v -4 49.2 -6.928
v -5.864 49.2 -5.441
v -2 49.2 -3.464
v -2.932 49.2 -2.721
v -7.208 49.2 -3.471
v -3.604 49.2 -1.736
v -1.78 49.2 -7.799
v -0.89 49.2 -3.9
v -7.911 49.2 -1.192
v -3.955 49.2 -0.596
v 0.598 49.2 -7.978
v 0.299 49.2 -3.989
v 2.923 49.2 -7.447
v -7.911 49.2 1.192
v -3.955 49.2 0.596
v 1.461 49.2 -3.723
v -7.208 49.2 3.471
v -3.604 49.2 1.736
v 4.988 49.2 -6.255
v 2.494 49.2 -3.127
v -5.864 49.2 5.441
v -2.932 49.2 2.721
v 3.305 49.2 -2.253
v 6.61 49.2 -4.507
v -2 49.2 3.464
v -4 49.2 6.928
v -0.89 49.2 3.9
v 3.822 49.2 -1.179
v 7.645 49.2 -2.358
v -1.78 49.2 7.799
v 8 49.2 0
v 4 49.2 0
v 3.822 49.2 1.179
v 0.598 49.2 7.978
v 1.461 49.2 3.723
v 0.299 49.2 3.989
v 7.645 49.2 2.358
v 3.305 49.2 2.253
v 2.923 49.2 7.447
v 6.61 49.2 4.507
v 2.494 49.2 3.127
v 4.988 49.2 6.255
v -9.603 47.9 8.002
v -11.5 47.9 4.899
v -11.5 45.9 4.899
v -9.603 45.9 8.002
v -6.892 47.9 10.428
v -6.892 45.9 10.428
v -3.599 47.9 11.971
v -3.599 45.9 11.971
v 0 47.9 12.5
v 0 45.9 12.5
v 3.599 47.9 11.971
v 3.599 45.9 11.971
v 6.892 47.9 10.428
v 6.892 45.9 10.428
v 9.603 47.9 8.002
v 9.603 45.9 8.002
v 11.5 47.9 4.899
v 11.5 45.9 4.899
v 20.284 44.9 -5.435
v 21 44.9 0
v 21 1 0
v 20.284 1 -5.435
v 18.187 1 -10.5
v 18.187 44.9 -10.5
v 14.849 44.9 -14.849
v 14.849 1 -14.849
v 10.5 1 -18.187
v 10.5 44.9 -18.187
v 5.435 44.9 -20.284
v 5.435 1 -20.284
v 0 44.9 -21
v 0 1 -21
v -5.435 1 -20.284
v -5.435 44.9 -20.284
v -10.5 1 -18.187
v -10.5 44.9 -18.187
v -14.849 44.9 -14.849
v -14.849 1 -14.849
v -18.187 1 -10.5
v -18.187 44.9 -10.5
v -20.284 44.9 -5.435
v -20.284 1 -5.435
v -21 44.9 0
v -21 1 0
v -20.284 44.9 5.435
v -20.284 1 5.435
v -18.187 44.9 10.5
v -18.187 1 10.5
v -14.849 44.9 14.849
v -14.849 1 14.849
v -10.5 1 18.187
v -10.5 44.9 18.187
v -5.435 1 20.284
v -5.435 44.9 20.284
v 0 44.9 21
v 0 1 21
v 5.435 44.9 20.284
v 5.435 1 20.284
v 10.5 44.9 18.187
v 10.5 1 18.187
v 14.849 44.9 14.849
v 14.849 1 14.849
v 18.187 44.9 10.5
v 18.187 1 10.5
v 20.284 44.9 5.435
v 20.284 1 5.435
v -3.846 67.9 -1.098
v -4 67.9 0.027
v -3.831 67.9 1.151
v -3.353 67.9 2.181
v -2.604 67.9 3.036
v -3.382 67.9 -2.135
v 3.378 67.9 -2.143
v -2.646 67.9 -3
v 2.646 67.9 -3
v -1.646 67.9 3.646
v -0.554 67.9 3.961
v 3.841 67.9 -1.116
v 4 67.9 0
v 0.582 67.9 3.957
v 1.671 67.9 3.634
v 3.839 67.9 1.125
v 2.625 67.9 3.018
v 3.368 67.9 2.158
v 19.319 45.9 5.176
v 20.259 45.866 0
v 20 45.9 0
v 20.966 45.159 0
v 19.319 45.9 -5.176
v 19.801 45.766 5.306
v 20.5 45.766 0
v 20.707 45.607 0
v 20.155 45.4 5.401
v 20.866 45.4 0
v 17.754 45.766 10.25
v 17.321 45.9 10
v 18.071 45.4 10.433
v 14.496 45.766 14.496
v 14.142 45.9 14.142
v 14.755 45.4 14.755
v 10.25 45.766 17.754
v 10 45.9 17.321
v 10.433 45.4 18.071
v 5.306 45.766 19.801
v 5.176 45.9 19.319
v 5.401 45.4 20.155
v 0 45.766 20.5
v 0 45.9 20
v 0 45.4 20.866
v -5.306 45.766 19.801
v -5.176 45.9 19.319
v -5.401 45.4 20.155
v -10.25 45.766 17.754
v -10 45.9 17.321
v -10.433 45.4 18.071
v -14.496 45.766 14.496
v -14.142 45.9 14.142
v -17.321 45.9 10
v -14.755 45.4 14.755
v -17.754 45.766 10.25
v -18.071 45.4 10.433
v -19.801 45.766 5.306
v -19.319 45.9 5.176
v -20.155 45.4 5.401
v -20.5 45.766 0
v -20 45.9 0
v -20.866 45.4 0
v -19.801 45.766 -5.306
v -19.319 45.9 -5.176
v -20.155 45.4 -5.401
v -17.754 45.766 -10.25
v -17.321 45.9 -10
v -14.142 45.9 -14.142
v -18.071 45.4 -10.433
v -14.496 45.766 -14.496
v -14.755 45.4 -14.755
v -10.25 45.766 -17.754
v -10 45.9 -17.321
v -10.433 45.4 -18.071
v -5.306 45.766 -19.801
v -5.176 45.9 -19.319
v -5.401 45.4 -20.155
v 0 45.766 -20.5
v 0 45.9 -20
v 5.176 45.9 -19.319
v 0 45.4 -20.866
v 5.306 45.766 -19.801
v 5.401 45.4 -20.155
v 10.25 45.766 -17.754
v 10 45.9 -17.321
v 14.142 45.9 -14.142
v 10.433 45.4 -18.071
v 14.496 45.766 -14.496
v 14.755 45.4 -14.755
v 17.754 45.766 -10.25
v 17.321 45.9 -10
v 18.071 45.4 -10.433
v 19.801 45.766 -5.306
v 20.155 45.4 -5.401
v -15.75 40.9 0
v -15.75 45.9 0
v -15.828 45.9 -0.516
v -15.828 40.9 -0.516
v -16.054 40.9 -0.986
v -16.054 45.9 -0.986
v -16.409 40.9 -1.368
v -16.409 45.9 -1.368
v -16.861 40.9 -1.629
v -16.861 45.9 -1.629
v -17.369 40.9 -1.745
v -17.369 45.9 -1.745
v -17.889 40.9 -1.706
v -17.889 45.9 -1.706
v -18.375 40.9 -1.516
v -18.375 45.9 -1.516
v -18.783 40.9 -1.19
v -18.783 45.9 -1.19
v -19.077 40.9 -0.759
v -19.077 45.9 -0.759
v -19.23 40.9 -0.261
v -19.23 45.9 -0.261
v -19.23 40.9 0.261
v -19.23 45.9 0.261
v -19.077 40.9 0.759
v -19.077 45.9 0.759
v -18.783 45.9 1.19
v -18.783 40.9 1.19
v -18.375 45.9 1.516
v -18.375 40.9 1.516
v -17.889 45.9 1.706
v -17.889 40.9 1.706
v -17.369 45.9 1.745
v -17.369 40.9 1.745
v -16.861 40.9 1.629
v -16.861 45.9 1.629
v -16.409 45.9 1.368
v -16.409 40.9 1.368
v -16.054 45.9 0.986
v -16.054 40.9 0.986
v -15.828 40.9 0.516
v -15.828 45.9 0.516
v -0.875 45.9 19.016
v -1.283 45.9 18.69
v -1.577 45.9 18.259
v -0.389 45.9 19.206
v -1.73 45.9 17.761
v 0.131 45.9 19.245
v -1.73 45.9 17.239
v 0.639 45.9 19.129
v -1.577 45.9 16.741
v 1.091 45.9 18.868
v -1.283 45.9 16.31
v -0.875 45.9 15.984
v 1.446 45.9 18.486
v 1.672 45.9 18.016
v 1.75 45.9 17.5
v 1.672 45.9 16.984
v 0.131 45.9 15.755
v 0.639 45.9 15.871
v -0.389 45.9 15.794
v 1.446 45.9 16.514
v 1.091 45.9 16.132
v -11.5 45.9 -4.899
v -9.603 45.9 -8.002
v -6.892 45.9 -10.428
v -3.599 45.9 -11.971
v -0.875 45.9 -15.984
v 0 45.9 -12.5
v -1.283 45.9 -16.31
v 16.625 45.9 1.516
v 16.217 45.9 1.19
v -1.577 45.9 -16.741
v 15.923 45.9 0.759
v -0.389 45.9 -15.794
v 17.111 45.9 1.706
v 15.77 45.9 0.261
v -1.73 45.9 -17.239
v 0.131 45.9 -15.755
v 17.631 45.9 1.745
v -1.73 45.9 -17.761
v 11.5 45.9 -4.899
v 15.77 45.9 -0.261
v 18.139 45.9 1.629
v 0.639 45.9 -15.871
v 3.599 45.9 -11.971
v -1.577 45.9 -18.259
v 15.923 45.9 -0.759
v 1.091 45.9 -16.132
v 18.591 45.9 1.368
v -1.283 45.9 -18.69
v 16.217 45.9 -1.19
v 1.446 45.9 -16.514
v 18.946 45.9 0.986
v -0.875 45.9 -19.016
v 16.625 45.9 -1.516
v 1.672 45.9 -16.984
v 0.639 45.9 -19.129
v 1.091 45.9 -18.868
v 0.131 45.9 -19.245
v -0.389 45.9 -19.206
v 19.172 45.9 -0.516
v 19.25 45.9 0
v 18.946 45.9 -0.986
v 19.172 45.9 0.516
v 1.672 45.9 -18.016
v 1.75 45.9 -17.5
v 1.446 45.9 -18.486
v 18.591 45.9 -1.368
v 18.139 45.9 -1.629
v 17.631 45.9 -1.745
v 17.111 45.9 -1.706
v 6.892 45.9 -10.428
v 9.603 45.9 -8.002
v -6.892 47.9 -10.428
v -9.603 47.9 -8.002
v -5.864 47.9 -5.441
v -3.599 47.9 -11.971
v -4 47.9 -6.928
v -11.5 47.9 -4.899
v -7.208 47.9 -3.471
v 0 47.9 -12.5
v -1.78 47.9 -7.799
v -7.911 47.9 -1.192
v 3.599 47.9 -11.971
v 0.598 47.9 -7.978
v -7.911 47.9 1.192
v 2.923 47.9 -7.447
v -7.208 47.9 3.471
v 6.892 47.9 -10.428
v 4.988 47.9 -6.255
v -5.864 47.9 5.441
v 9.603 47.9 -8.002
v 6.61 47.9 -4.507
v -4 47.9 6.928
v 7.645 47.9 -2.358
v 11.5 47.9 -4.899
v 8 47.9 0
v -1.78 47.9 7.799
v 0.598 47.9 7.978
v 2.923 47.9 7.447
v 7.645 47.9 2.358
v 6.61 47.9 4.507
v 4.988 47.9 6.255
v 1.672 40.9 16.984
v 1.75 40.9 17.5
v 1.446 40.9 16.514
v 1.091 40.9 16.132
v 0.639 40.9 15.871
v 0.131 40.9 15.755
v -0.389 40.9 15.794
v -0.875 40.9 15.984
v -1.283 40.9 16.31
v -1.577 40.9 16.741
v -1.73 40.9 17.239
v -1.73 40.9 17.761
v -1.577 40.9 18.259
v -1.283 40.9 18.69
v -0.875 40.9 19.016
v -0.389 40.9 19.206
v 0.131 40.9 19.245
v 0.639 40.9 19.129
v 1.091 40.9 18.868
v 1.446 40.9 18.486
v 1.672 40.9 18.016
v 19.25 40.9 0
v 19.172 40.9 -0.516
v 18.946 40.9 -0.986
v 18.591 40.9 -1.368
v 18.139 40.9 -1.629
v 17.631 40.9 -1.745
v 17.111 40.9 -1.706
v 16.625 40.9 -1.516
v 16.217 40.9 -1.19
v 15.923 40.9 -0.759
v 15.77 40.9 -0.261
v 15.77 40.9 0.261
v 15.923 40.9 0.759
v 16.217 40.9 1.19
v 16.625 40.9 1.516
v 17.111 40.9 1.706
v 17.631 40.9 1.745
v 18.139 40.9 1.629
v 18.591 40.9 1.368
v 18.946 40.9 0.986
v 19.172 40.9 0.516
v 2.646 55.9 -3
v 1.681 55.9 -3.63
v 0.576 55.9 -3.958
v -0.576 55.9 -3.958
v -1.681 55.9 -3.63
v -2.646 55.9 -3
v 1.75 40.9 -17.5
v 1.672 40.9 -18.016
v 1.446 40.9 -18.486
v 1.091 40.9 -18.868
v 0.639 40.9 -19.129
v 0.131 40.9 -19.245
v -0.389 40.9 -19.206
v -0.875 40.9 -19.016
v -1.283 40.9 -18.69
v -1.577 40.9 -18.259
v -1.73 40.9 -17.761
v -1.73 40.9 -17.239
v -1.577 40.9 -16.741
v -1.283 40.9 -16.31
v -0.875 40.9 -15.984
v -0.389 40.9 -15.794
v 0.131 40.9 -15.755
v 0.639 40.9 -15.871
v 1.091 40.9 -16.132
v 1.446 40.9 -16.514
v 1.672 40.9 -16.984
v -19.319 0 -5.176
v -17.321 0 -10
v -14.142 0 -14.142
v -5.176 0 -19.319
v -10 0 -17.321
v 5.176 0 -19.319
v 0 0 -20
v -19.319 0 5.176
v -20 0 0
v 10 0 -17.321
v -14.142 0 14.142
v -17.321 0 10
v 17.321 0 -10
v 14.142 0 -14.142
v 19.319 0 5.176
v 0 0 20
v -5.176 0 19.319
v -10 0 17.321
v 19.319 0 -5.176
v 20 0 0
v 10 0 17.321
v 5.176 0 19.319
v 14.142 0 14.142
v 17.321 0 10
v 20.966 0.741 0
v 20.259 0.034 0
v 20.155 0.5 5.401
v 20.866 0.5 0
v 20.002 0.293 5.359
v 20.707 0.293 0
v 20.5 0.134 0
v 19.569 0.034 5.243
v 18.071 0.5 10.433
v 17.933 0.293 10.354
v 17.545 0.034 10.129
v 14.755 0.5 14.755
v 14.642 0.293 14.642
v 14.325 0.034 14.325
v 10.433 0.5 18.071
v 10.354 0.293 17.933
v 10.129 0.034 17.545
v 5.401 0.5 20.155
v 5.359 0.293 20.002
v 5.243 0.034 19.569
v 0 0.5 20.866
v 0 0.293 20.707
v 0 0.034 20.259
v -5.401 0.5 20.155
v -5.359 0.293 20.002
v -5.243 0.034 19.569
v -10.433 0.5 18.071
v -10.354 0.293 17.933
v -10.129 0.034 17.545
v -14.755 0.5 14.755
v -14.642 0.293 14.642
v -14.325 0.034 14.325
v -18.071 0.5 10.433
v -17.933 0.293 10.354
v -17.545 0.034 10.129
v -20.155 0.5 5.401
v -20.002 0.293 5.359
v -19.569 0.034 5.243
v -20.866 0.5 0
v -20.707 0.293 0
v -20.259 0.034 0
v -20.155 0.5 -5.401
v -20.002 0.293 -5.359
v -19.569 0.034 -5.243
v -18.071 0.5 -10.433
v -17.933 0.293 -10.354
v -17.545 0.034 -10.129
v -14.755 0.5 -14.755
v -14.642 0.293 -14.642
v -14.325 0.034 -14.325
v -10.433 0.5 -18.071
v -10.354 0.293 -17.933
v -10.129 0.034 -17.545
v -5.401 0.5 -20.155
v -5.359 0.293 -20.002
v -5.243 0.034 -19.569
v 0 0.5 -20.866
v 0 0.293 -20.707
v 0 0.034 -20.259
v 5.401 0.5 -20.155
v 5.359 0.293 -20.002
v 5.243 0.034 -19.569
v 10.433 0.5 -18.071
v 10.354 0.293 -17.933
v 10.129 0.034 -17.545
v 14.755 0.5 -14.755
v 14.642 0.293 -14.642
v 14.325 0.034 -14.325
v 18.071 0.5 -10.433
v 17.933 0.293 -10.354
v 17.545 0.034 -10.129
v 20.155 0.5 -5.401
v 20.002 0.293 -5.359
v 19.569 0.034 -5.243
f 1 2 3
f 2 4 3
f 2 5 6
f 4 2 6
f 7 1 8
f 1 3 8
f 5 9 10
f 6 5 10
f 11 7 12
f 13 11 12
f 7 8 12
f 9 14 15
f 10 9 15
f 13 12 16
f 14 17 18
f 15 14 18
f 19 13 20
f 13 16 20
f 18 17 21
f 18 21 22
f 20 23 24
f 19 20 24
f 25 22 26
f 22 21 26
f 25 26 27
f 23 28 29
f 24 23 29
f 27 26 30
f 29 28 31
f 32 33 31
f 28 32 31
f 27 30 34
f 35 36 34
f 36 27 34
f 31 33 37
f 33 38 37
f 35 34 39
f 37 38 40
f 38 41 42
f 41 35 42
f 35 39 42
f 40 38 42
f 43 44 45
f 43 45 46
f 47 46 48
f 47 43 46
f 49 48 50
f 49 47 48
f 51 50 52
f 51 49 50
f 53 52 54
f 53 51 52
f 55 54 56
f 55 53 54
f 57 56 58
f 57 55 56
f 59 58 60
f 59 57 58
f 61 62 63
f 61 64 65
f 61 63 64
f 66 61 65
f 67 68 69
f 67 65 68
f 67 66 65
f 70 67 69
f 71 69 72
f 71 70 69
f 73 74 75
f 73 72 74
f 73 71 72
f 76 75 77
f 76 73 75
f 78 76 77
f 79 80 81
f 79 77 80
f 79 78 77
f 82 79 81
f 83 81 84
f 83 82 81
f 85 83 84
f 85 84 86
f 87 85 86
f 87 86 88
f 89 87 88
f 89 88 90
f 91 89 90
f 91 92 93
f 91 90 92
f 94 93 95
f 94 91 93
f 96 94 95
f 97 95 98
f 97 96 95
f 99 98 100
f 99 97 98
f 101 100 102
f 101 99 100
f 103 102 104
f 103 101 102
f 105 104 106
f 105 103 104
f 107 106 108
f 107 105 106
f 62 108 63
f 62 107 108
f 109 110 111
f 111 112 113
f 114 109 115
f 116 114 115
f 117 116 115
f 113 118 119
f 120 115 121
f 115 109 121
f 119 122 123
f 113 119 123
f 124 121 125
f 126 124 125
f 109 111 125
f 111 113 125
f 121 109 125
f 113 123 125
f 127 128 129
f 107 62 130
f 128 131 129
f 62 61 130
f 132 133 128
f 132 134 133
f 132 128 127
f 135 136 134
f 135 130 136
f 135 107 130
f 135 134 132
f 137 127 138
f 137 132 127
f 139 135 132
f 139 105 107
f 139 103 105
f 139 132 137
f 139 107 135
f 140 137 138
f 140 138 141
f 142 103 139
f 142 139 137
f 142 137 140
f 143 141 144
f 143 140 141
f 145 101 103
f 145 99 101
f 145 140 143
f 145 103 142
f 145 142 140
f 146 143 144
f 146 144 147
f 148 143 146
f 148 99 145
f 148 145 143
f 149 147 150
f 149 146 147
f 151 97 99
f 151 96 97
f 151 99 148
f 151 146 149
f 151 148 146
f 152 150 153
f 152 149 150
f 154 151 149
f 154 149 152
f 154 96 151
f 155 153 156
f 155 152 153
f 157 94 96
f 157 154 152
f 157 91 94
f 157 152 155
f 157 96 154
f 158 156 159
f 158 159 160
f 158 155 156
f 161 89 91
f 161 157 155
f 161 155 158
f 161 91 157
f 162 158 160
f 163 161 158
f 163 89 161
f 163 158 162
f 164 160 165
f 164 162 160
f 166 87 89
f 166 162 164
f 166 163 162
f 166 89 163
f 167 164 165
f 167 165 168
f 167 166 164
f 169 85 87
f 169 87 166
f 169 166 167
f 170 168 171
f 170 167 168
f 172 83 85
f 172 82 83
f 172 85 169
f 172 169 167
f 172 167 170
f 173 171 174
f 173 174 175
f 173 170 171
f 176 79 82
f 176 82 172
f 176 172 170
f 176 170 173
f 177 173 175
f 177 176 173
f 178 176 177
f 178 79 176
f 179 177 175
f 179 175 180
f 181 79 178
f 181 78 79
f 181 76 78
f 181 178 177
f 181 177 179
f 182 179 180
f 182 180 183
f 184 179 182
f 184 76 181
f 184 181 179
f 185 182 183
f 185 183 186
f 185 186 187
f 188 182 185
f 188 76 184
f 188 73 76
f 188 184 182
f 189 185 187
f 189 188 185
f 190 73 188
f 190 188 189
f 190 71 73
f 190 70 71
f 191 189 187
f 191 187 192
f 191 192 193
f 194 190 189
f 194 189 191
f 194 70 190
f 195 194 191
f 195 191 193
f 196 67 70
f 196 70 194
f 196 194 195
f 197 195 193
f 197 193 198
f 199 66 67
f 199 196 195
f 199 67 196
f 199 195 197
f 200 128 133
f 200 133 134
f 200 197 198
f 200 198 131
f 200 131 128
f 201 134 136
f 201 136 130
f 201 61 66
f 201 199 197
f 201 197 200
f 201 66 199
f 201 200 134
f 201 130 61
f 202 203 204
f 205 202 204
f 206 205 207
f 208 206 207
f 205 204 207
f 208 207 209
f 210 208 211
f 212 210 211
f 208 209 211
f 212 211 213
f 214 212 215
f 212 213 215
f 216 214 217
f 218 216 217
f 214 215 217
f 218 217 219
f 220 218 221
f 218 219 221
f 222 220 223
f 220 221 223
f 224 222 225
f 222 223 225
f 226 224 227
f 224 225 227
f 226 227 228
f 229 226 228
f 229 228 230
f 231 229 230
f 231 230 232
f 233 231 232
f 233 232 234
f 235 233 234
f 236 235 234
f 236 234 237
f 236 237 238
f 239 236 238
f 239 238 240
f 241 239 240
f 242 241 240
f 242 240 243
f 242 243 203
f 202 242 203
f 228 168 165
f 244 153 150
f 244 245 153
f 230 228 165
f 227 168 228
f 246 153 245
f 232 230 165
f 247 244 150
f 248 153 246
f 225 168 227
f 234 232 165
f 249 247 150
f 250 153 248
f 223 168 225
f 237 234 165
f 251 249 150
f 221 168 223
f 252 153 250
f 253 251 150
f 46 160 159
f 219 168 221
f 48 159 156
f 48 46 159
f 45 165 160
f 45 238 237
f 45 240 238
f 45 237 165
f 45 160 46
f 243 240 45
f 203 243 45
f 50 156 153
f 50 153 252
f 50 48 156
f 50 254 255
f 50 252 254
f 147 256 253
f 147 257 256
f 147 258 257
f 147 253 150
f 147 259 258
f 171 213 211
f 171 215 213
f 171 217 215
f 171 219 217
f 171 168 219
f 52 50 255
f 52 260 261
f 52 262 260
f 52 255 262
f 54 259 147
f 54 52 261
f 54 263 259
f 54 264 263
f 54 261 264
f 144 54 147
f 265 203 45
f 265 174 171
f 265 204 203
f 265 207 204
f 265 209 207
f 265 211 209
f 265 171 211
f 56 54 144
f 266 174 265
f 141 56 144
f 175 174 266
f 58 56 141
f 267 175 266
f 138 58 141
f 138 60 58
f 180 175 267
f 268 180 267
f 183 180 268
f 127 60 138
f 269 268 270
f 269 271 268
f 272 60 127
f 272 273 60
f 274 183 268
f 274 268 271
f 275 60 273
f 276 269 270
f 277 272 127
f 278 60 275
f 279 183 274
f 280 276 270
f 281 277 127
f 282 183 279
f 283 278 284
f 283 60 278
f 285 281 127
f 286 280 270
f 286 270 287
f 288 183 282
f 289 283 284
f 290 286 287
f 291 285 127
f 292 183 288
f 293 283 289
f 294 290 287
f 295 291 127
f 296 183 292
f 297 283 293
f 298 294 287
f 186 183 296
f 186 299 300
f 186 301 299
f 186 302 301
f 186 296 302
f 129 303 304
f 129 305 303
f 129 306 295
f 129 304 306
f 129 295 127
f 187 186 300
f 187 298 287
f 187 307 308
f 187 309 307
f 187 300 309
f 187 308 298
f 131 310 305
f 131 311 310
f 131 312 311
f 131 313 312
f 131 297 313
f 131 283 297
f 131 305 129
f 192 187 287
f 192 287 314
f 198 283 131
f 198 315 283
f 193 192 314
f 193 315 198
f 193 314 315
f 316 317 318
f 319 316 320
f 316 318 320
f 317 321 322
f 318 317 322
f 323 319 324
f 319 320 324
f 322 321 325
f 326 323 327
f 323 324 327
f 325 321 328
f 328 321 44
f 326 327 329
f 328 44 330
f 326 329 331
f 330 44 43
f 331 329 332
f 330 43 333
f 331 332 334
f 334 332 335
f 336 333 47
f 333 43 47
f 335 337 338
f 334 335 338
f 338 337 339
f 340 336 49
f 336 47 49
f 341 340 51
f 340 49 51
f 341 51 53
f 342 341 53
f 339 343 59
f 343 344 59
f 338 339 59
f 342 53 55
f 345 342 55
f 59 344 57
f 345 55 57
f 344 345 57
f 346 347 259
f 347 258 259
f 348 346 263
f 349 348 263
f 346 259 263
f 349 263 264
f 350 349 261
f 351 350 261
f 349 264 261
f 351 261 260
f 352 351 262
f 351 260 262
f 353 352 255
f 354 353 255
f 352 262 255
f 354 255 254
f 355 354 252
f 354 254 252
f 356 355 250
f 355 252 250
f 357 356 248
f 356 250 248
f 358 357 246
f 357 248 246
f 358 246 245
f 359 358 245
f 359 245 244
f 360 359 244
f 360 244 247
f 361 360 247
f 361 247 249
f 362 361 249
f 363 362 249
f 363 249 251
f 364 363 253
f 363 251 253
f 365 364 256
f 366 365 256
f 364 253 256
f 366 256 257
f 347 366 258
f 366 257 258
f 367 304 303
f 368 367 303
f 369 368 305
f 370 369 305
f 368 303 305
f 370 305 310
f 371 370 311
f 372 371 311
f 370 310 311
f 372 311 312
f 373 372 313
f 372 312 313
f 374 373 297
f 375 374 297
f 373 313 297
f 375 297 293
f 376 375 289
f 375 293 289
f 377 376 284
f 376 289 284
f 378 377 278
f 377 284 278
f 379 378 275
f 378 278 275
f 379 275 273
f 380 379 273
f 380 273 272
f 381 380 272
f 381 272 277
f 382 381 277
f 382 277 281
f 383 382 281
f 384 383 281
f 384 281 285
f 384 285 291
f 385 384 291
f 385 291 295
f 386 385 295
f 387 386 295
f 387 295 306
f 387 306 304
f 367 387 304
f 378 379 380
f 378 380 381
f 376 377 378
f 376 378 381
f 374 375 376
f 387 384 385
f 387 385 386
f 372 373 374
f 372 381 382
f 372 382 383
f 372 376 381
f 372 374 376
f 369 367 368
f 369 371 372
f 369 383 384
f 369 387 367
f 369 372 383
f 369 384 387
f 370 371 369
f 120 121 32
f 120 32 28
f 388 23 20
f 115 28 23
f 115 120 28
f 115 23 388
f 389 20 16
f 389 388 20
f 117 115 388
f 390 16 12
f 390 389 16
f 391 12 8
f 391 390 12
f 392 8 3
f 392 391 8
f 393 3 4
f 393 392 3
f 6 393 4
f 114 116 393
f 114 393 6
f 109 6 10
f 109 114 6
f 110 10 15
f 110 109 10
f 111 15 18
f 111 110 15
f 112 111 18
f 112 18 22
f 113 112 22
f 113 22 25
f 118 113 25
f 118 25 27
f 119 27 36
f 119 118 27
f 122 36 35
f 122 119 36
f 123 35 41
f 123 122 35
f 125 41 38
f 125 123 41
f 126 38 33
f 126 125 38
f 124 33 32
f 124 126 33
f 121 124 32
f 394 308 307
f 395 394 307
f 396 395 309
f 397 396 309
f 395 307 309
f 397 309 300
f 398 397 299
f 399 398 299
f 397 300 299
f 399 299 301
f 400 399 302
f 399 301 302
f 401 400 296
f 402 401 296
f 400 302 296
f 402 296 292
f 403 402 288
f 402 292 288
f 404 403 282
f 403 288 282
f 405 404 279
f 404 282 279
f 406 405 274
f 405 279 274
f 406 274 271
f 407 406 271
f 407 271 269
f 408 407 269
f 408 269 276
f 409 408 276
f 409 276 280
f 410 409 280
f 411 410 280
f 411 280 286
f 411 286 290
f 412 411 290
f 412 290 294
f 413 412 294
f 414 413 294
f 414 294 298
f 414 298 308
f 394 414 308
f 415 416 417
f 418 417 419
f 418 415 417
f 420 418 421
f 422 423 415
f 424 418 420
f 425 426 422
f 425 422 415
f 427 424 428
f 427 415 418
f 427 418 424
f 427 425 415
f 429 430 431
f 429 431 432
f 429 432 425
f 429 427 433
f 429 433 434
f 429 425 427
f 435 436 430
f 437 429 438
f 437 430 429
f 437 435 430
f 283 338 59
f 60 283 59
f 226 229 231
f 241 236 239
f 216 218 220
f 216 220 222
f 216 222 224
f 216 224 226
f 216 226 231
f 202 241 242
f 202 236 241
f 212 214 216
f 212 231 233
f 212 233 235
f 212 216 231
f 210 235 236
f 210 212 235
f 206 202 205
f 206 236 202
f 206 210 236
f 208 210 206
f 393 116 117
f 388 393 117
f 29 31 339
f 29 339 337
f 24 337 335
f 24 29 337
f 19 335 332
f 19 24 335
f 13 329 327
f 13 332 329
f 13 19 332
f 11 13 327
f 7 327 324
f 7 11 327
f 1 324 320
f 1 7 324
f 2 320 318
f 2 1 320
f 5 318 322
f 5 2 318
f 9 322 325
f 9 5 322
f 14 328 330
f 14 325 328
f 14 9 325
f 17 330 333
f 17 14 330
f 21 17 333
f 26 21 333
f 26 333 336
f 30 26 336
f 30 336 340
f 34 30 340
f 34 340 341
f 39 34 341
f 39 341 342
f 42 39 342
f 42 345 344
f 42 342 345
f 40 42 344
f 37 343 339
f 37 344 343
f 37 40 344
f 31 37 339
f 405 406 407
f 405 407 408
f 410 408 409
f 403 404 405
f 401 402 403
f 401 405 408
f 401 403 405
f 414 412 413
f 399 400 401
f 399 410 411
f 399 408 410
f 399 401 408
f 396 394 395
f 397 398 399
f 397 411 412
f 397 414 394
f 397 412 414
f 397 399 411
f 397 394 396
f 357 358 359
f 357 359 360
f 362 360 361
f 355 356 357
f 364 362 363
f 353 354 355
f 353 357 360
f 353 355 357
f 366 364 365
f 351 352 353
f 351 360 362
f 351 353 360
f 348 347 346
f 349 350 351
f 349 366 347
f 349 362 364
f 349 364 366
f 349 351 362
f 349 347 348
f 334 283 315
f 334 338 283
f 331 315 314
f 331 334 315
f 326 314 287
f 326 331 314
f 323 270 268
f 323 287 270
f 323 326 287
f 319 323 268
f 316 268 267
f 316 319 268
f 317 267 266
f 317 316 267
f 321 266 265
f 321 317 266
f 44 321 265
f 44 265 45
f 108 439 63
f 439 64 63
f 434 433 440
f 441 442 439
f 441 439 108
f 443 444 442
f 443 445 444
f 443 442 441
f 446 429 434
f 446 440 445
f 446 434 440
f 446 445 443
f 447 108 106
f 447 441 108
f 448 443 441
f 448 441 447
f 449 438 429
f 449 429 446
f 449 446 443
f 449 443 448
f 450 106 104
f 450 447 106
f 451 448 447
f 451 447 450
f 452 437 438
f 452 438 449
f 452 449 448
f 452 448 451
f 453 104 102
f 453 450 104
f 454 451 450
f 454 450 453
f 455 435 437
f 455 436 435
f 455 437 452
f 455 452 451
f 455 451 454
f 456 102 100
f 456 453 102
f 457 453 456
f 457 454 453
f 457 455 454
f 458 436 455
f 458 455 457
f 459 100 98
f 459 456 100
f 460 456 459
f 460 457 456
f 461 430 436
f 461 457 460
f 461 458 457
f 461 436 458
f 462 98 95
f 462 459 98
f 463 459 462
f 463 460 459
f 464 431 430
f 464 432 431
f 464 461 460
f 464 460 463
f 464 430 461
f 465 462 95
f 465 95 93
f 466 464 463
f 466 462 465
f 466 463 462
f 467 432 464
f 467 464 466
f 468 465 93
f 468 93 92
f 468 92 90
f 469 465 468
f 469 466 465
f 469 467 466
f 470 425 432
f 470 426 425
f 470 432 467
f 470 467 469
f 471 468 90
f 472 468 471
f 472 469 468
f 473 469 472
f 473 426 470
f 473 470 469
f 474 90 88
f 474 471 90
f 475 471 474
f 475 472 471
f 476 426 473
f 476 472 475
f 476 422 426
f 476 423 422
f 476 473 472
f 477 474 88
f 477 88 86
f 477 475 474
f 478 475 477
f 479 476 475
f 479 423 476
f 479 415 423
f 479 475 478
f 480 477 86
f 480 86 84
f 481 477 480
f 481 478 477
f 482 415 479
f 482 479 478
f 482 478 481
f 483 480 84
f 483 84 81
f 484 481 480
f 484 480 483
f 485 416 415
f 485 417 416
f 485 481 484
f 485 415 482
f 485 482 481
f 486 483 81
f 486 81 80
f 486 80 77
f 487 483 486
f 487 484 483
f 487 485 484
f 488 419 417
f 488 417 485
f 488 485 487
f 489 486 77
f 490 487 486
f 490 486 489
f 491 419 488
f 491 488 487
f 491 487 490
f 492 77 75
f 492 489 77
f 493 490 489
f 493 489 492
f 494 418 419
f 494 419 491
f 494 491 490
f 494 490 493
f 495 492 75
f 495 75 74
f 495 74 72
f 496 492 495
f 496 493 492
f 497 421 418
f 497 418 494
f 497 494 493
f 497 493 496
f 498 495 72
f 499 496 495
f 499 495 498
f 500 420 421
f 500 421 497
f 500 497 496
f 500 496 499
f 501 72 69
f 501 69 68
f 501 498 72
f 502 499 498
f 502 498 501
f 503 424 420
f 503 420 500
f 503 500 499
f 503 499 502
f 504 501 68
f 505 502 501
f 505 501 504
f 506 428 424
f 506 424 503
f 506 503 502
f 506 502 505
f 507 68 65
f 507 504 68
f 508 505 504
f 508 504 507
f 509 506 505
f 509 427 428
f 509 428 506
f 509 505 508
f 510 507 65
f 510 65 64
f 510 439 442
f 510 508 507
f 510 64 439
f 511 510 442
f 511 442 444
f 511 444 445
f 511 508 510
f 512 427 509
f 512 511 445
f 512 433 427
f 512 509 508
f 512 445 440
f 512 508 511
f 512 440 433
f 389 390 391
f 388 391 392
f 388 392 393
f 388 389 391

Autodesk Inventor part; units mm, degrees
ref_plane "YZ Plane" through (0, 0, 0) normal (1, 0, 0) x (0, 1, 0)
ref_plane "XZ Plane" through (0, 0, 0) normal (0, 1, 0) x (-1, 0, 0)
ref_plane "XY Plane" through (0, 0, 0) normal (0, 0, 1) x (1, 0, 0)
sketch "スケッチ1" plane through (0, 0, 0) normal (0, 0, 1) x (1, 0, 0)
  line L0 (0, 0) -> (21, 0)
  line L1 (21, 0) -> (21, 45.9)
  line L2 (21, 45.9) -> (12.5, 45.9)
  line L3 (12.5, 45.9) -> (12.5, 47.9)
  line L4 (12.5, 47.9) -> (8, 47.9)
  line L5 (8, 47.9) -> (8, 49.2)
  line L6 (8, 49.2) -> (4, 49.2)
  line L7 (4, 49.2) -> (4, 67.9)
  line L8 (4, 67.9) -> (0, 67.9)
  line L9 (0, 67.9) -> (0, 0)
  dimension "d0" = 21
  dimension "d1" = 4
  dimension "d2" = 12.5
  dimension "d3" = 2
  dimension "d4" = 8
  dimension "d5" = 1.3
  dimension "d6" = 45.9
  dimension "d8" = 20
revolve "回転1" add sketch "スケッチ1" angle 360 about axis through (0, 67.9, 0) along (0, -1, 0)
sketch "スケッチ2" plane through (0, 67.9, 0) normal (0, 1, 0) x (1, 0, 0)
  line L0 (-2.6458, 3) -> (2.6458, 3)
  circle A0 centre (0, 0) radius 4 projected
  arc A1 (2.6458, 3) -> (-2.6458, 3) centre (0, 0) ccw
  dimension "d10" = 3
extrude "押し出し1" cut sketch "スケッチ2" against normal blind 12 contours A0 L0 picked at (0.5822, 3.4764)
sketch "スケッチ4" plane through (0, 47.9, 0) normal (0, 1, 0) x (1, 0, 0)
  line L0 (0, 0) -> (0, 29.0549) construction
  arc A0 (11.5, -4.899) -> (11.5, 4.899) centre (0, 0) ccw
  line L1 (11.5, 4.899) -> (11.5, -4.899)
  circle A1 centre (0, 0) radius 12.5 projected
  arc A2 (-11.5, 4.899) -> (-11.5, -4.899) centre (0, 0) ccw
  line L2 (-11.5, 4.899) -> (-11.5, -4.899)
  dimension "d13" = 11.5
extrude "押し出し2" cut sketch "スケッチ4" against normal blind 2 contours L1 A0 | A1 L2
fillet "フィレット1" radius 1 2 edges at (-21, 45.9, 0) (-21, 0, 0)
sketch "スケッチ5" plane through (0, 45.9, 0) normal (0, 1, 0) x (1, 0, 0)
  circle A0 centre (0, 0) radius 17.5 construction
  circle A1 centre (-17.5, 0) radius 1.75
  line L0 (0, 0) -> (-17.5, 0) construction
  circle A2 centre (0, -17.5) radius 1.75
  circle A3 centre (17.5, 0) radius 1.75
  circle A4 centre (0, 17.5) radius 1.75
  dimension "d18" = 35
  dimension "d17" = 3.5
  dimension "d21" = 360
extrude "押し出し3" cut sketch "スケッチ5" against normal blind 5
properties part number "IG42C-144"
